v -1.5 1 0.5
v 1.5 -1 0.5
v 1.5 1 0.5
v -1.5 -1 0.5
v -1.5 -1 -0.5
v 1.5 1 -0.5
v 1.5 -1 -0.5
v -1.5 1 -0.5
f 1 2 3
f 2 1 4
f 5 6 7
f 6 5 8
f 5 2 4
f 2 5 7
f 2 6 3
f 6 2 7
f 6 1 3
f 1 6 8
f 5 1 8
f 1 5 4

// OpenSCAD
//Test do OpenScad
//Crtl+D = Comentar.
//Ctrl+shift+D = Descomentar.
$fn=200;//resolução do meu objeto.

//Criação de um cubo:
//cube([2]);//Cubo cujo os lados são 2 milímetros.
//cube([3,2,1]);//Para criação de um cubo com lados diferentes, se coloca entre colchetes([]) os valores de X, Y e Z. Ou seja, o 3,2,1 do comando.
cube([3,2,1],center=true);//Da mesma forma se eu quiser mudar a origem do sistema do meu objeto para o centro dele eu adiciono o comando "center=true".
